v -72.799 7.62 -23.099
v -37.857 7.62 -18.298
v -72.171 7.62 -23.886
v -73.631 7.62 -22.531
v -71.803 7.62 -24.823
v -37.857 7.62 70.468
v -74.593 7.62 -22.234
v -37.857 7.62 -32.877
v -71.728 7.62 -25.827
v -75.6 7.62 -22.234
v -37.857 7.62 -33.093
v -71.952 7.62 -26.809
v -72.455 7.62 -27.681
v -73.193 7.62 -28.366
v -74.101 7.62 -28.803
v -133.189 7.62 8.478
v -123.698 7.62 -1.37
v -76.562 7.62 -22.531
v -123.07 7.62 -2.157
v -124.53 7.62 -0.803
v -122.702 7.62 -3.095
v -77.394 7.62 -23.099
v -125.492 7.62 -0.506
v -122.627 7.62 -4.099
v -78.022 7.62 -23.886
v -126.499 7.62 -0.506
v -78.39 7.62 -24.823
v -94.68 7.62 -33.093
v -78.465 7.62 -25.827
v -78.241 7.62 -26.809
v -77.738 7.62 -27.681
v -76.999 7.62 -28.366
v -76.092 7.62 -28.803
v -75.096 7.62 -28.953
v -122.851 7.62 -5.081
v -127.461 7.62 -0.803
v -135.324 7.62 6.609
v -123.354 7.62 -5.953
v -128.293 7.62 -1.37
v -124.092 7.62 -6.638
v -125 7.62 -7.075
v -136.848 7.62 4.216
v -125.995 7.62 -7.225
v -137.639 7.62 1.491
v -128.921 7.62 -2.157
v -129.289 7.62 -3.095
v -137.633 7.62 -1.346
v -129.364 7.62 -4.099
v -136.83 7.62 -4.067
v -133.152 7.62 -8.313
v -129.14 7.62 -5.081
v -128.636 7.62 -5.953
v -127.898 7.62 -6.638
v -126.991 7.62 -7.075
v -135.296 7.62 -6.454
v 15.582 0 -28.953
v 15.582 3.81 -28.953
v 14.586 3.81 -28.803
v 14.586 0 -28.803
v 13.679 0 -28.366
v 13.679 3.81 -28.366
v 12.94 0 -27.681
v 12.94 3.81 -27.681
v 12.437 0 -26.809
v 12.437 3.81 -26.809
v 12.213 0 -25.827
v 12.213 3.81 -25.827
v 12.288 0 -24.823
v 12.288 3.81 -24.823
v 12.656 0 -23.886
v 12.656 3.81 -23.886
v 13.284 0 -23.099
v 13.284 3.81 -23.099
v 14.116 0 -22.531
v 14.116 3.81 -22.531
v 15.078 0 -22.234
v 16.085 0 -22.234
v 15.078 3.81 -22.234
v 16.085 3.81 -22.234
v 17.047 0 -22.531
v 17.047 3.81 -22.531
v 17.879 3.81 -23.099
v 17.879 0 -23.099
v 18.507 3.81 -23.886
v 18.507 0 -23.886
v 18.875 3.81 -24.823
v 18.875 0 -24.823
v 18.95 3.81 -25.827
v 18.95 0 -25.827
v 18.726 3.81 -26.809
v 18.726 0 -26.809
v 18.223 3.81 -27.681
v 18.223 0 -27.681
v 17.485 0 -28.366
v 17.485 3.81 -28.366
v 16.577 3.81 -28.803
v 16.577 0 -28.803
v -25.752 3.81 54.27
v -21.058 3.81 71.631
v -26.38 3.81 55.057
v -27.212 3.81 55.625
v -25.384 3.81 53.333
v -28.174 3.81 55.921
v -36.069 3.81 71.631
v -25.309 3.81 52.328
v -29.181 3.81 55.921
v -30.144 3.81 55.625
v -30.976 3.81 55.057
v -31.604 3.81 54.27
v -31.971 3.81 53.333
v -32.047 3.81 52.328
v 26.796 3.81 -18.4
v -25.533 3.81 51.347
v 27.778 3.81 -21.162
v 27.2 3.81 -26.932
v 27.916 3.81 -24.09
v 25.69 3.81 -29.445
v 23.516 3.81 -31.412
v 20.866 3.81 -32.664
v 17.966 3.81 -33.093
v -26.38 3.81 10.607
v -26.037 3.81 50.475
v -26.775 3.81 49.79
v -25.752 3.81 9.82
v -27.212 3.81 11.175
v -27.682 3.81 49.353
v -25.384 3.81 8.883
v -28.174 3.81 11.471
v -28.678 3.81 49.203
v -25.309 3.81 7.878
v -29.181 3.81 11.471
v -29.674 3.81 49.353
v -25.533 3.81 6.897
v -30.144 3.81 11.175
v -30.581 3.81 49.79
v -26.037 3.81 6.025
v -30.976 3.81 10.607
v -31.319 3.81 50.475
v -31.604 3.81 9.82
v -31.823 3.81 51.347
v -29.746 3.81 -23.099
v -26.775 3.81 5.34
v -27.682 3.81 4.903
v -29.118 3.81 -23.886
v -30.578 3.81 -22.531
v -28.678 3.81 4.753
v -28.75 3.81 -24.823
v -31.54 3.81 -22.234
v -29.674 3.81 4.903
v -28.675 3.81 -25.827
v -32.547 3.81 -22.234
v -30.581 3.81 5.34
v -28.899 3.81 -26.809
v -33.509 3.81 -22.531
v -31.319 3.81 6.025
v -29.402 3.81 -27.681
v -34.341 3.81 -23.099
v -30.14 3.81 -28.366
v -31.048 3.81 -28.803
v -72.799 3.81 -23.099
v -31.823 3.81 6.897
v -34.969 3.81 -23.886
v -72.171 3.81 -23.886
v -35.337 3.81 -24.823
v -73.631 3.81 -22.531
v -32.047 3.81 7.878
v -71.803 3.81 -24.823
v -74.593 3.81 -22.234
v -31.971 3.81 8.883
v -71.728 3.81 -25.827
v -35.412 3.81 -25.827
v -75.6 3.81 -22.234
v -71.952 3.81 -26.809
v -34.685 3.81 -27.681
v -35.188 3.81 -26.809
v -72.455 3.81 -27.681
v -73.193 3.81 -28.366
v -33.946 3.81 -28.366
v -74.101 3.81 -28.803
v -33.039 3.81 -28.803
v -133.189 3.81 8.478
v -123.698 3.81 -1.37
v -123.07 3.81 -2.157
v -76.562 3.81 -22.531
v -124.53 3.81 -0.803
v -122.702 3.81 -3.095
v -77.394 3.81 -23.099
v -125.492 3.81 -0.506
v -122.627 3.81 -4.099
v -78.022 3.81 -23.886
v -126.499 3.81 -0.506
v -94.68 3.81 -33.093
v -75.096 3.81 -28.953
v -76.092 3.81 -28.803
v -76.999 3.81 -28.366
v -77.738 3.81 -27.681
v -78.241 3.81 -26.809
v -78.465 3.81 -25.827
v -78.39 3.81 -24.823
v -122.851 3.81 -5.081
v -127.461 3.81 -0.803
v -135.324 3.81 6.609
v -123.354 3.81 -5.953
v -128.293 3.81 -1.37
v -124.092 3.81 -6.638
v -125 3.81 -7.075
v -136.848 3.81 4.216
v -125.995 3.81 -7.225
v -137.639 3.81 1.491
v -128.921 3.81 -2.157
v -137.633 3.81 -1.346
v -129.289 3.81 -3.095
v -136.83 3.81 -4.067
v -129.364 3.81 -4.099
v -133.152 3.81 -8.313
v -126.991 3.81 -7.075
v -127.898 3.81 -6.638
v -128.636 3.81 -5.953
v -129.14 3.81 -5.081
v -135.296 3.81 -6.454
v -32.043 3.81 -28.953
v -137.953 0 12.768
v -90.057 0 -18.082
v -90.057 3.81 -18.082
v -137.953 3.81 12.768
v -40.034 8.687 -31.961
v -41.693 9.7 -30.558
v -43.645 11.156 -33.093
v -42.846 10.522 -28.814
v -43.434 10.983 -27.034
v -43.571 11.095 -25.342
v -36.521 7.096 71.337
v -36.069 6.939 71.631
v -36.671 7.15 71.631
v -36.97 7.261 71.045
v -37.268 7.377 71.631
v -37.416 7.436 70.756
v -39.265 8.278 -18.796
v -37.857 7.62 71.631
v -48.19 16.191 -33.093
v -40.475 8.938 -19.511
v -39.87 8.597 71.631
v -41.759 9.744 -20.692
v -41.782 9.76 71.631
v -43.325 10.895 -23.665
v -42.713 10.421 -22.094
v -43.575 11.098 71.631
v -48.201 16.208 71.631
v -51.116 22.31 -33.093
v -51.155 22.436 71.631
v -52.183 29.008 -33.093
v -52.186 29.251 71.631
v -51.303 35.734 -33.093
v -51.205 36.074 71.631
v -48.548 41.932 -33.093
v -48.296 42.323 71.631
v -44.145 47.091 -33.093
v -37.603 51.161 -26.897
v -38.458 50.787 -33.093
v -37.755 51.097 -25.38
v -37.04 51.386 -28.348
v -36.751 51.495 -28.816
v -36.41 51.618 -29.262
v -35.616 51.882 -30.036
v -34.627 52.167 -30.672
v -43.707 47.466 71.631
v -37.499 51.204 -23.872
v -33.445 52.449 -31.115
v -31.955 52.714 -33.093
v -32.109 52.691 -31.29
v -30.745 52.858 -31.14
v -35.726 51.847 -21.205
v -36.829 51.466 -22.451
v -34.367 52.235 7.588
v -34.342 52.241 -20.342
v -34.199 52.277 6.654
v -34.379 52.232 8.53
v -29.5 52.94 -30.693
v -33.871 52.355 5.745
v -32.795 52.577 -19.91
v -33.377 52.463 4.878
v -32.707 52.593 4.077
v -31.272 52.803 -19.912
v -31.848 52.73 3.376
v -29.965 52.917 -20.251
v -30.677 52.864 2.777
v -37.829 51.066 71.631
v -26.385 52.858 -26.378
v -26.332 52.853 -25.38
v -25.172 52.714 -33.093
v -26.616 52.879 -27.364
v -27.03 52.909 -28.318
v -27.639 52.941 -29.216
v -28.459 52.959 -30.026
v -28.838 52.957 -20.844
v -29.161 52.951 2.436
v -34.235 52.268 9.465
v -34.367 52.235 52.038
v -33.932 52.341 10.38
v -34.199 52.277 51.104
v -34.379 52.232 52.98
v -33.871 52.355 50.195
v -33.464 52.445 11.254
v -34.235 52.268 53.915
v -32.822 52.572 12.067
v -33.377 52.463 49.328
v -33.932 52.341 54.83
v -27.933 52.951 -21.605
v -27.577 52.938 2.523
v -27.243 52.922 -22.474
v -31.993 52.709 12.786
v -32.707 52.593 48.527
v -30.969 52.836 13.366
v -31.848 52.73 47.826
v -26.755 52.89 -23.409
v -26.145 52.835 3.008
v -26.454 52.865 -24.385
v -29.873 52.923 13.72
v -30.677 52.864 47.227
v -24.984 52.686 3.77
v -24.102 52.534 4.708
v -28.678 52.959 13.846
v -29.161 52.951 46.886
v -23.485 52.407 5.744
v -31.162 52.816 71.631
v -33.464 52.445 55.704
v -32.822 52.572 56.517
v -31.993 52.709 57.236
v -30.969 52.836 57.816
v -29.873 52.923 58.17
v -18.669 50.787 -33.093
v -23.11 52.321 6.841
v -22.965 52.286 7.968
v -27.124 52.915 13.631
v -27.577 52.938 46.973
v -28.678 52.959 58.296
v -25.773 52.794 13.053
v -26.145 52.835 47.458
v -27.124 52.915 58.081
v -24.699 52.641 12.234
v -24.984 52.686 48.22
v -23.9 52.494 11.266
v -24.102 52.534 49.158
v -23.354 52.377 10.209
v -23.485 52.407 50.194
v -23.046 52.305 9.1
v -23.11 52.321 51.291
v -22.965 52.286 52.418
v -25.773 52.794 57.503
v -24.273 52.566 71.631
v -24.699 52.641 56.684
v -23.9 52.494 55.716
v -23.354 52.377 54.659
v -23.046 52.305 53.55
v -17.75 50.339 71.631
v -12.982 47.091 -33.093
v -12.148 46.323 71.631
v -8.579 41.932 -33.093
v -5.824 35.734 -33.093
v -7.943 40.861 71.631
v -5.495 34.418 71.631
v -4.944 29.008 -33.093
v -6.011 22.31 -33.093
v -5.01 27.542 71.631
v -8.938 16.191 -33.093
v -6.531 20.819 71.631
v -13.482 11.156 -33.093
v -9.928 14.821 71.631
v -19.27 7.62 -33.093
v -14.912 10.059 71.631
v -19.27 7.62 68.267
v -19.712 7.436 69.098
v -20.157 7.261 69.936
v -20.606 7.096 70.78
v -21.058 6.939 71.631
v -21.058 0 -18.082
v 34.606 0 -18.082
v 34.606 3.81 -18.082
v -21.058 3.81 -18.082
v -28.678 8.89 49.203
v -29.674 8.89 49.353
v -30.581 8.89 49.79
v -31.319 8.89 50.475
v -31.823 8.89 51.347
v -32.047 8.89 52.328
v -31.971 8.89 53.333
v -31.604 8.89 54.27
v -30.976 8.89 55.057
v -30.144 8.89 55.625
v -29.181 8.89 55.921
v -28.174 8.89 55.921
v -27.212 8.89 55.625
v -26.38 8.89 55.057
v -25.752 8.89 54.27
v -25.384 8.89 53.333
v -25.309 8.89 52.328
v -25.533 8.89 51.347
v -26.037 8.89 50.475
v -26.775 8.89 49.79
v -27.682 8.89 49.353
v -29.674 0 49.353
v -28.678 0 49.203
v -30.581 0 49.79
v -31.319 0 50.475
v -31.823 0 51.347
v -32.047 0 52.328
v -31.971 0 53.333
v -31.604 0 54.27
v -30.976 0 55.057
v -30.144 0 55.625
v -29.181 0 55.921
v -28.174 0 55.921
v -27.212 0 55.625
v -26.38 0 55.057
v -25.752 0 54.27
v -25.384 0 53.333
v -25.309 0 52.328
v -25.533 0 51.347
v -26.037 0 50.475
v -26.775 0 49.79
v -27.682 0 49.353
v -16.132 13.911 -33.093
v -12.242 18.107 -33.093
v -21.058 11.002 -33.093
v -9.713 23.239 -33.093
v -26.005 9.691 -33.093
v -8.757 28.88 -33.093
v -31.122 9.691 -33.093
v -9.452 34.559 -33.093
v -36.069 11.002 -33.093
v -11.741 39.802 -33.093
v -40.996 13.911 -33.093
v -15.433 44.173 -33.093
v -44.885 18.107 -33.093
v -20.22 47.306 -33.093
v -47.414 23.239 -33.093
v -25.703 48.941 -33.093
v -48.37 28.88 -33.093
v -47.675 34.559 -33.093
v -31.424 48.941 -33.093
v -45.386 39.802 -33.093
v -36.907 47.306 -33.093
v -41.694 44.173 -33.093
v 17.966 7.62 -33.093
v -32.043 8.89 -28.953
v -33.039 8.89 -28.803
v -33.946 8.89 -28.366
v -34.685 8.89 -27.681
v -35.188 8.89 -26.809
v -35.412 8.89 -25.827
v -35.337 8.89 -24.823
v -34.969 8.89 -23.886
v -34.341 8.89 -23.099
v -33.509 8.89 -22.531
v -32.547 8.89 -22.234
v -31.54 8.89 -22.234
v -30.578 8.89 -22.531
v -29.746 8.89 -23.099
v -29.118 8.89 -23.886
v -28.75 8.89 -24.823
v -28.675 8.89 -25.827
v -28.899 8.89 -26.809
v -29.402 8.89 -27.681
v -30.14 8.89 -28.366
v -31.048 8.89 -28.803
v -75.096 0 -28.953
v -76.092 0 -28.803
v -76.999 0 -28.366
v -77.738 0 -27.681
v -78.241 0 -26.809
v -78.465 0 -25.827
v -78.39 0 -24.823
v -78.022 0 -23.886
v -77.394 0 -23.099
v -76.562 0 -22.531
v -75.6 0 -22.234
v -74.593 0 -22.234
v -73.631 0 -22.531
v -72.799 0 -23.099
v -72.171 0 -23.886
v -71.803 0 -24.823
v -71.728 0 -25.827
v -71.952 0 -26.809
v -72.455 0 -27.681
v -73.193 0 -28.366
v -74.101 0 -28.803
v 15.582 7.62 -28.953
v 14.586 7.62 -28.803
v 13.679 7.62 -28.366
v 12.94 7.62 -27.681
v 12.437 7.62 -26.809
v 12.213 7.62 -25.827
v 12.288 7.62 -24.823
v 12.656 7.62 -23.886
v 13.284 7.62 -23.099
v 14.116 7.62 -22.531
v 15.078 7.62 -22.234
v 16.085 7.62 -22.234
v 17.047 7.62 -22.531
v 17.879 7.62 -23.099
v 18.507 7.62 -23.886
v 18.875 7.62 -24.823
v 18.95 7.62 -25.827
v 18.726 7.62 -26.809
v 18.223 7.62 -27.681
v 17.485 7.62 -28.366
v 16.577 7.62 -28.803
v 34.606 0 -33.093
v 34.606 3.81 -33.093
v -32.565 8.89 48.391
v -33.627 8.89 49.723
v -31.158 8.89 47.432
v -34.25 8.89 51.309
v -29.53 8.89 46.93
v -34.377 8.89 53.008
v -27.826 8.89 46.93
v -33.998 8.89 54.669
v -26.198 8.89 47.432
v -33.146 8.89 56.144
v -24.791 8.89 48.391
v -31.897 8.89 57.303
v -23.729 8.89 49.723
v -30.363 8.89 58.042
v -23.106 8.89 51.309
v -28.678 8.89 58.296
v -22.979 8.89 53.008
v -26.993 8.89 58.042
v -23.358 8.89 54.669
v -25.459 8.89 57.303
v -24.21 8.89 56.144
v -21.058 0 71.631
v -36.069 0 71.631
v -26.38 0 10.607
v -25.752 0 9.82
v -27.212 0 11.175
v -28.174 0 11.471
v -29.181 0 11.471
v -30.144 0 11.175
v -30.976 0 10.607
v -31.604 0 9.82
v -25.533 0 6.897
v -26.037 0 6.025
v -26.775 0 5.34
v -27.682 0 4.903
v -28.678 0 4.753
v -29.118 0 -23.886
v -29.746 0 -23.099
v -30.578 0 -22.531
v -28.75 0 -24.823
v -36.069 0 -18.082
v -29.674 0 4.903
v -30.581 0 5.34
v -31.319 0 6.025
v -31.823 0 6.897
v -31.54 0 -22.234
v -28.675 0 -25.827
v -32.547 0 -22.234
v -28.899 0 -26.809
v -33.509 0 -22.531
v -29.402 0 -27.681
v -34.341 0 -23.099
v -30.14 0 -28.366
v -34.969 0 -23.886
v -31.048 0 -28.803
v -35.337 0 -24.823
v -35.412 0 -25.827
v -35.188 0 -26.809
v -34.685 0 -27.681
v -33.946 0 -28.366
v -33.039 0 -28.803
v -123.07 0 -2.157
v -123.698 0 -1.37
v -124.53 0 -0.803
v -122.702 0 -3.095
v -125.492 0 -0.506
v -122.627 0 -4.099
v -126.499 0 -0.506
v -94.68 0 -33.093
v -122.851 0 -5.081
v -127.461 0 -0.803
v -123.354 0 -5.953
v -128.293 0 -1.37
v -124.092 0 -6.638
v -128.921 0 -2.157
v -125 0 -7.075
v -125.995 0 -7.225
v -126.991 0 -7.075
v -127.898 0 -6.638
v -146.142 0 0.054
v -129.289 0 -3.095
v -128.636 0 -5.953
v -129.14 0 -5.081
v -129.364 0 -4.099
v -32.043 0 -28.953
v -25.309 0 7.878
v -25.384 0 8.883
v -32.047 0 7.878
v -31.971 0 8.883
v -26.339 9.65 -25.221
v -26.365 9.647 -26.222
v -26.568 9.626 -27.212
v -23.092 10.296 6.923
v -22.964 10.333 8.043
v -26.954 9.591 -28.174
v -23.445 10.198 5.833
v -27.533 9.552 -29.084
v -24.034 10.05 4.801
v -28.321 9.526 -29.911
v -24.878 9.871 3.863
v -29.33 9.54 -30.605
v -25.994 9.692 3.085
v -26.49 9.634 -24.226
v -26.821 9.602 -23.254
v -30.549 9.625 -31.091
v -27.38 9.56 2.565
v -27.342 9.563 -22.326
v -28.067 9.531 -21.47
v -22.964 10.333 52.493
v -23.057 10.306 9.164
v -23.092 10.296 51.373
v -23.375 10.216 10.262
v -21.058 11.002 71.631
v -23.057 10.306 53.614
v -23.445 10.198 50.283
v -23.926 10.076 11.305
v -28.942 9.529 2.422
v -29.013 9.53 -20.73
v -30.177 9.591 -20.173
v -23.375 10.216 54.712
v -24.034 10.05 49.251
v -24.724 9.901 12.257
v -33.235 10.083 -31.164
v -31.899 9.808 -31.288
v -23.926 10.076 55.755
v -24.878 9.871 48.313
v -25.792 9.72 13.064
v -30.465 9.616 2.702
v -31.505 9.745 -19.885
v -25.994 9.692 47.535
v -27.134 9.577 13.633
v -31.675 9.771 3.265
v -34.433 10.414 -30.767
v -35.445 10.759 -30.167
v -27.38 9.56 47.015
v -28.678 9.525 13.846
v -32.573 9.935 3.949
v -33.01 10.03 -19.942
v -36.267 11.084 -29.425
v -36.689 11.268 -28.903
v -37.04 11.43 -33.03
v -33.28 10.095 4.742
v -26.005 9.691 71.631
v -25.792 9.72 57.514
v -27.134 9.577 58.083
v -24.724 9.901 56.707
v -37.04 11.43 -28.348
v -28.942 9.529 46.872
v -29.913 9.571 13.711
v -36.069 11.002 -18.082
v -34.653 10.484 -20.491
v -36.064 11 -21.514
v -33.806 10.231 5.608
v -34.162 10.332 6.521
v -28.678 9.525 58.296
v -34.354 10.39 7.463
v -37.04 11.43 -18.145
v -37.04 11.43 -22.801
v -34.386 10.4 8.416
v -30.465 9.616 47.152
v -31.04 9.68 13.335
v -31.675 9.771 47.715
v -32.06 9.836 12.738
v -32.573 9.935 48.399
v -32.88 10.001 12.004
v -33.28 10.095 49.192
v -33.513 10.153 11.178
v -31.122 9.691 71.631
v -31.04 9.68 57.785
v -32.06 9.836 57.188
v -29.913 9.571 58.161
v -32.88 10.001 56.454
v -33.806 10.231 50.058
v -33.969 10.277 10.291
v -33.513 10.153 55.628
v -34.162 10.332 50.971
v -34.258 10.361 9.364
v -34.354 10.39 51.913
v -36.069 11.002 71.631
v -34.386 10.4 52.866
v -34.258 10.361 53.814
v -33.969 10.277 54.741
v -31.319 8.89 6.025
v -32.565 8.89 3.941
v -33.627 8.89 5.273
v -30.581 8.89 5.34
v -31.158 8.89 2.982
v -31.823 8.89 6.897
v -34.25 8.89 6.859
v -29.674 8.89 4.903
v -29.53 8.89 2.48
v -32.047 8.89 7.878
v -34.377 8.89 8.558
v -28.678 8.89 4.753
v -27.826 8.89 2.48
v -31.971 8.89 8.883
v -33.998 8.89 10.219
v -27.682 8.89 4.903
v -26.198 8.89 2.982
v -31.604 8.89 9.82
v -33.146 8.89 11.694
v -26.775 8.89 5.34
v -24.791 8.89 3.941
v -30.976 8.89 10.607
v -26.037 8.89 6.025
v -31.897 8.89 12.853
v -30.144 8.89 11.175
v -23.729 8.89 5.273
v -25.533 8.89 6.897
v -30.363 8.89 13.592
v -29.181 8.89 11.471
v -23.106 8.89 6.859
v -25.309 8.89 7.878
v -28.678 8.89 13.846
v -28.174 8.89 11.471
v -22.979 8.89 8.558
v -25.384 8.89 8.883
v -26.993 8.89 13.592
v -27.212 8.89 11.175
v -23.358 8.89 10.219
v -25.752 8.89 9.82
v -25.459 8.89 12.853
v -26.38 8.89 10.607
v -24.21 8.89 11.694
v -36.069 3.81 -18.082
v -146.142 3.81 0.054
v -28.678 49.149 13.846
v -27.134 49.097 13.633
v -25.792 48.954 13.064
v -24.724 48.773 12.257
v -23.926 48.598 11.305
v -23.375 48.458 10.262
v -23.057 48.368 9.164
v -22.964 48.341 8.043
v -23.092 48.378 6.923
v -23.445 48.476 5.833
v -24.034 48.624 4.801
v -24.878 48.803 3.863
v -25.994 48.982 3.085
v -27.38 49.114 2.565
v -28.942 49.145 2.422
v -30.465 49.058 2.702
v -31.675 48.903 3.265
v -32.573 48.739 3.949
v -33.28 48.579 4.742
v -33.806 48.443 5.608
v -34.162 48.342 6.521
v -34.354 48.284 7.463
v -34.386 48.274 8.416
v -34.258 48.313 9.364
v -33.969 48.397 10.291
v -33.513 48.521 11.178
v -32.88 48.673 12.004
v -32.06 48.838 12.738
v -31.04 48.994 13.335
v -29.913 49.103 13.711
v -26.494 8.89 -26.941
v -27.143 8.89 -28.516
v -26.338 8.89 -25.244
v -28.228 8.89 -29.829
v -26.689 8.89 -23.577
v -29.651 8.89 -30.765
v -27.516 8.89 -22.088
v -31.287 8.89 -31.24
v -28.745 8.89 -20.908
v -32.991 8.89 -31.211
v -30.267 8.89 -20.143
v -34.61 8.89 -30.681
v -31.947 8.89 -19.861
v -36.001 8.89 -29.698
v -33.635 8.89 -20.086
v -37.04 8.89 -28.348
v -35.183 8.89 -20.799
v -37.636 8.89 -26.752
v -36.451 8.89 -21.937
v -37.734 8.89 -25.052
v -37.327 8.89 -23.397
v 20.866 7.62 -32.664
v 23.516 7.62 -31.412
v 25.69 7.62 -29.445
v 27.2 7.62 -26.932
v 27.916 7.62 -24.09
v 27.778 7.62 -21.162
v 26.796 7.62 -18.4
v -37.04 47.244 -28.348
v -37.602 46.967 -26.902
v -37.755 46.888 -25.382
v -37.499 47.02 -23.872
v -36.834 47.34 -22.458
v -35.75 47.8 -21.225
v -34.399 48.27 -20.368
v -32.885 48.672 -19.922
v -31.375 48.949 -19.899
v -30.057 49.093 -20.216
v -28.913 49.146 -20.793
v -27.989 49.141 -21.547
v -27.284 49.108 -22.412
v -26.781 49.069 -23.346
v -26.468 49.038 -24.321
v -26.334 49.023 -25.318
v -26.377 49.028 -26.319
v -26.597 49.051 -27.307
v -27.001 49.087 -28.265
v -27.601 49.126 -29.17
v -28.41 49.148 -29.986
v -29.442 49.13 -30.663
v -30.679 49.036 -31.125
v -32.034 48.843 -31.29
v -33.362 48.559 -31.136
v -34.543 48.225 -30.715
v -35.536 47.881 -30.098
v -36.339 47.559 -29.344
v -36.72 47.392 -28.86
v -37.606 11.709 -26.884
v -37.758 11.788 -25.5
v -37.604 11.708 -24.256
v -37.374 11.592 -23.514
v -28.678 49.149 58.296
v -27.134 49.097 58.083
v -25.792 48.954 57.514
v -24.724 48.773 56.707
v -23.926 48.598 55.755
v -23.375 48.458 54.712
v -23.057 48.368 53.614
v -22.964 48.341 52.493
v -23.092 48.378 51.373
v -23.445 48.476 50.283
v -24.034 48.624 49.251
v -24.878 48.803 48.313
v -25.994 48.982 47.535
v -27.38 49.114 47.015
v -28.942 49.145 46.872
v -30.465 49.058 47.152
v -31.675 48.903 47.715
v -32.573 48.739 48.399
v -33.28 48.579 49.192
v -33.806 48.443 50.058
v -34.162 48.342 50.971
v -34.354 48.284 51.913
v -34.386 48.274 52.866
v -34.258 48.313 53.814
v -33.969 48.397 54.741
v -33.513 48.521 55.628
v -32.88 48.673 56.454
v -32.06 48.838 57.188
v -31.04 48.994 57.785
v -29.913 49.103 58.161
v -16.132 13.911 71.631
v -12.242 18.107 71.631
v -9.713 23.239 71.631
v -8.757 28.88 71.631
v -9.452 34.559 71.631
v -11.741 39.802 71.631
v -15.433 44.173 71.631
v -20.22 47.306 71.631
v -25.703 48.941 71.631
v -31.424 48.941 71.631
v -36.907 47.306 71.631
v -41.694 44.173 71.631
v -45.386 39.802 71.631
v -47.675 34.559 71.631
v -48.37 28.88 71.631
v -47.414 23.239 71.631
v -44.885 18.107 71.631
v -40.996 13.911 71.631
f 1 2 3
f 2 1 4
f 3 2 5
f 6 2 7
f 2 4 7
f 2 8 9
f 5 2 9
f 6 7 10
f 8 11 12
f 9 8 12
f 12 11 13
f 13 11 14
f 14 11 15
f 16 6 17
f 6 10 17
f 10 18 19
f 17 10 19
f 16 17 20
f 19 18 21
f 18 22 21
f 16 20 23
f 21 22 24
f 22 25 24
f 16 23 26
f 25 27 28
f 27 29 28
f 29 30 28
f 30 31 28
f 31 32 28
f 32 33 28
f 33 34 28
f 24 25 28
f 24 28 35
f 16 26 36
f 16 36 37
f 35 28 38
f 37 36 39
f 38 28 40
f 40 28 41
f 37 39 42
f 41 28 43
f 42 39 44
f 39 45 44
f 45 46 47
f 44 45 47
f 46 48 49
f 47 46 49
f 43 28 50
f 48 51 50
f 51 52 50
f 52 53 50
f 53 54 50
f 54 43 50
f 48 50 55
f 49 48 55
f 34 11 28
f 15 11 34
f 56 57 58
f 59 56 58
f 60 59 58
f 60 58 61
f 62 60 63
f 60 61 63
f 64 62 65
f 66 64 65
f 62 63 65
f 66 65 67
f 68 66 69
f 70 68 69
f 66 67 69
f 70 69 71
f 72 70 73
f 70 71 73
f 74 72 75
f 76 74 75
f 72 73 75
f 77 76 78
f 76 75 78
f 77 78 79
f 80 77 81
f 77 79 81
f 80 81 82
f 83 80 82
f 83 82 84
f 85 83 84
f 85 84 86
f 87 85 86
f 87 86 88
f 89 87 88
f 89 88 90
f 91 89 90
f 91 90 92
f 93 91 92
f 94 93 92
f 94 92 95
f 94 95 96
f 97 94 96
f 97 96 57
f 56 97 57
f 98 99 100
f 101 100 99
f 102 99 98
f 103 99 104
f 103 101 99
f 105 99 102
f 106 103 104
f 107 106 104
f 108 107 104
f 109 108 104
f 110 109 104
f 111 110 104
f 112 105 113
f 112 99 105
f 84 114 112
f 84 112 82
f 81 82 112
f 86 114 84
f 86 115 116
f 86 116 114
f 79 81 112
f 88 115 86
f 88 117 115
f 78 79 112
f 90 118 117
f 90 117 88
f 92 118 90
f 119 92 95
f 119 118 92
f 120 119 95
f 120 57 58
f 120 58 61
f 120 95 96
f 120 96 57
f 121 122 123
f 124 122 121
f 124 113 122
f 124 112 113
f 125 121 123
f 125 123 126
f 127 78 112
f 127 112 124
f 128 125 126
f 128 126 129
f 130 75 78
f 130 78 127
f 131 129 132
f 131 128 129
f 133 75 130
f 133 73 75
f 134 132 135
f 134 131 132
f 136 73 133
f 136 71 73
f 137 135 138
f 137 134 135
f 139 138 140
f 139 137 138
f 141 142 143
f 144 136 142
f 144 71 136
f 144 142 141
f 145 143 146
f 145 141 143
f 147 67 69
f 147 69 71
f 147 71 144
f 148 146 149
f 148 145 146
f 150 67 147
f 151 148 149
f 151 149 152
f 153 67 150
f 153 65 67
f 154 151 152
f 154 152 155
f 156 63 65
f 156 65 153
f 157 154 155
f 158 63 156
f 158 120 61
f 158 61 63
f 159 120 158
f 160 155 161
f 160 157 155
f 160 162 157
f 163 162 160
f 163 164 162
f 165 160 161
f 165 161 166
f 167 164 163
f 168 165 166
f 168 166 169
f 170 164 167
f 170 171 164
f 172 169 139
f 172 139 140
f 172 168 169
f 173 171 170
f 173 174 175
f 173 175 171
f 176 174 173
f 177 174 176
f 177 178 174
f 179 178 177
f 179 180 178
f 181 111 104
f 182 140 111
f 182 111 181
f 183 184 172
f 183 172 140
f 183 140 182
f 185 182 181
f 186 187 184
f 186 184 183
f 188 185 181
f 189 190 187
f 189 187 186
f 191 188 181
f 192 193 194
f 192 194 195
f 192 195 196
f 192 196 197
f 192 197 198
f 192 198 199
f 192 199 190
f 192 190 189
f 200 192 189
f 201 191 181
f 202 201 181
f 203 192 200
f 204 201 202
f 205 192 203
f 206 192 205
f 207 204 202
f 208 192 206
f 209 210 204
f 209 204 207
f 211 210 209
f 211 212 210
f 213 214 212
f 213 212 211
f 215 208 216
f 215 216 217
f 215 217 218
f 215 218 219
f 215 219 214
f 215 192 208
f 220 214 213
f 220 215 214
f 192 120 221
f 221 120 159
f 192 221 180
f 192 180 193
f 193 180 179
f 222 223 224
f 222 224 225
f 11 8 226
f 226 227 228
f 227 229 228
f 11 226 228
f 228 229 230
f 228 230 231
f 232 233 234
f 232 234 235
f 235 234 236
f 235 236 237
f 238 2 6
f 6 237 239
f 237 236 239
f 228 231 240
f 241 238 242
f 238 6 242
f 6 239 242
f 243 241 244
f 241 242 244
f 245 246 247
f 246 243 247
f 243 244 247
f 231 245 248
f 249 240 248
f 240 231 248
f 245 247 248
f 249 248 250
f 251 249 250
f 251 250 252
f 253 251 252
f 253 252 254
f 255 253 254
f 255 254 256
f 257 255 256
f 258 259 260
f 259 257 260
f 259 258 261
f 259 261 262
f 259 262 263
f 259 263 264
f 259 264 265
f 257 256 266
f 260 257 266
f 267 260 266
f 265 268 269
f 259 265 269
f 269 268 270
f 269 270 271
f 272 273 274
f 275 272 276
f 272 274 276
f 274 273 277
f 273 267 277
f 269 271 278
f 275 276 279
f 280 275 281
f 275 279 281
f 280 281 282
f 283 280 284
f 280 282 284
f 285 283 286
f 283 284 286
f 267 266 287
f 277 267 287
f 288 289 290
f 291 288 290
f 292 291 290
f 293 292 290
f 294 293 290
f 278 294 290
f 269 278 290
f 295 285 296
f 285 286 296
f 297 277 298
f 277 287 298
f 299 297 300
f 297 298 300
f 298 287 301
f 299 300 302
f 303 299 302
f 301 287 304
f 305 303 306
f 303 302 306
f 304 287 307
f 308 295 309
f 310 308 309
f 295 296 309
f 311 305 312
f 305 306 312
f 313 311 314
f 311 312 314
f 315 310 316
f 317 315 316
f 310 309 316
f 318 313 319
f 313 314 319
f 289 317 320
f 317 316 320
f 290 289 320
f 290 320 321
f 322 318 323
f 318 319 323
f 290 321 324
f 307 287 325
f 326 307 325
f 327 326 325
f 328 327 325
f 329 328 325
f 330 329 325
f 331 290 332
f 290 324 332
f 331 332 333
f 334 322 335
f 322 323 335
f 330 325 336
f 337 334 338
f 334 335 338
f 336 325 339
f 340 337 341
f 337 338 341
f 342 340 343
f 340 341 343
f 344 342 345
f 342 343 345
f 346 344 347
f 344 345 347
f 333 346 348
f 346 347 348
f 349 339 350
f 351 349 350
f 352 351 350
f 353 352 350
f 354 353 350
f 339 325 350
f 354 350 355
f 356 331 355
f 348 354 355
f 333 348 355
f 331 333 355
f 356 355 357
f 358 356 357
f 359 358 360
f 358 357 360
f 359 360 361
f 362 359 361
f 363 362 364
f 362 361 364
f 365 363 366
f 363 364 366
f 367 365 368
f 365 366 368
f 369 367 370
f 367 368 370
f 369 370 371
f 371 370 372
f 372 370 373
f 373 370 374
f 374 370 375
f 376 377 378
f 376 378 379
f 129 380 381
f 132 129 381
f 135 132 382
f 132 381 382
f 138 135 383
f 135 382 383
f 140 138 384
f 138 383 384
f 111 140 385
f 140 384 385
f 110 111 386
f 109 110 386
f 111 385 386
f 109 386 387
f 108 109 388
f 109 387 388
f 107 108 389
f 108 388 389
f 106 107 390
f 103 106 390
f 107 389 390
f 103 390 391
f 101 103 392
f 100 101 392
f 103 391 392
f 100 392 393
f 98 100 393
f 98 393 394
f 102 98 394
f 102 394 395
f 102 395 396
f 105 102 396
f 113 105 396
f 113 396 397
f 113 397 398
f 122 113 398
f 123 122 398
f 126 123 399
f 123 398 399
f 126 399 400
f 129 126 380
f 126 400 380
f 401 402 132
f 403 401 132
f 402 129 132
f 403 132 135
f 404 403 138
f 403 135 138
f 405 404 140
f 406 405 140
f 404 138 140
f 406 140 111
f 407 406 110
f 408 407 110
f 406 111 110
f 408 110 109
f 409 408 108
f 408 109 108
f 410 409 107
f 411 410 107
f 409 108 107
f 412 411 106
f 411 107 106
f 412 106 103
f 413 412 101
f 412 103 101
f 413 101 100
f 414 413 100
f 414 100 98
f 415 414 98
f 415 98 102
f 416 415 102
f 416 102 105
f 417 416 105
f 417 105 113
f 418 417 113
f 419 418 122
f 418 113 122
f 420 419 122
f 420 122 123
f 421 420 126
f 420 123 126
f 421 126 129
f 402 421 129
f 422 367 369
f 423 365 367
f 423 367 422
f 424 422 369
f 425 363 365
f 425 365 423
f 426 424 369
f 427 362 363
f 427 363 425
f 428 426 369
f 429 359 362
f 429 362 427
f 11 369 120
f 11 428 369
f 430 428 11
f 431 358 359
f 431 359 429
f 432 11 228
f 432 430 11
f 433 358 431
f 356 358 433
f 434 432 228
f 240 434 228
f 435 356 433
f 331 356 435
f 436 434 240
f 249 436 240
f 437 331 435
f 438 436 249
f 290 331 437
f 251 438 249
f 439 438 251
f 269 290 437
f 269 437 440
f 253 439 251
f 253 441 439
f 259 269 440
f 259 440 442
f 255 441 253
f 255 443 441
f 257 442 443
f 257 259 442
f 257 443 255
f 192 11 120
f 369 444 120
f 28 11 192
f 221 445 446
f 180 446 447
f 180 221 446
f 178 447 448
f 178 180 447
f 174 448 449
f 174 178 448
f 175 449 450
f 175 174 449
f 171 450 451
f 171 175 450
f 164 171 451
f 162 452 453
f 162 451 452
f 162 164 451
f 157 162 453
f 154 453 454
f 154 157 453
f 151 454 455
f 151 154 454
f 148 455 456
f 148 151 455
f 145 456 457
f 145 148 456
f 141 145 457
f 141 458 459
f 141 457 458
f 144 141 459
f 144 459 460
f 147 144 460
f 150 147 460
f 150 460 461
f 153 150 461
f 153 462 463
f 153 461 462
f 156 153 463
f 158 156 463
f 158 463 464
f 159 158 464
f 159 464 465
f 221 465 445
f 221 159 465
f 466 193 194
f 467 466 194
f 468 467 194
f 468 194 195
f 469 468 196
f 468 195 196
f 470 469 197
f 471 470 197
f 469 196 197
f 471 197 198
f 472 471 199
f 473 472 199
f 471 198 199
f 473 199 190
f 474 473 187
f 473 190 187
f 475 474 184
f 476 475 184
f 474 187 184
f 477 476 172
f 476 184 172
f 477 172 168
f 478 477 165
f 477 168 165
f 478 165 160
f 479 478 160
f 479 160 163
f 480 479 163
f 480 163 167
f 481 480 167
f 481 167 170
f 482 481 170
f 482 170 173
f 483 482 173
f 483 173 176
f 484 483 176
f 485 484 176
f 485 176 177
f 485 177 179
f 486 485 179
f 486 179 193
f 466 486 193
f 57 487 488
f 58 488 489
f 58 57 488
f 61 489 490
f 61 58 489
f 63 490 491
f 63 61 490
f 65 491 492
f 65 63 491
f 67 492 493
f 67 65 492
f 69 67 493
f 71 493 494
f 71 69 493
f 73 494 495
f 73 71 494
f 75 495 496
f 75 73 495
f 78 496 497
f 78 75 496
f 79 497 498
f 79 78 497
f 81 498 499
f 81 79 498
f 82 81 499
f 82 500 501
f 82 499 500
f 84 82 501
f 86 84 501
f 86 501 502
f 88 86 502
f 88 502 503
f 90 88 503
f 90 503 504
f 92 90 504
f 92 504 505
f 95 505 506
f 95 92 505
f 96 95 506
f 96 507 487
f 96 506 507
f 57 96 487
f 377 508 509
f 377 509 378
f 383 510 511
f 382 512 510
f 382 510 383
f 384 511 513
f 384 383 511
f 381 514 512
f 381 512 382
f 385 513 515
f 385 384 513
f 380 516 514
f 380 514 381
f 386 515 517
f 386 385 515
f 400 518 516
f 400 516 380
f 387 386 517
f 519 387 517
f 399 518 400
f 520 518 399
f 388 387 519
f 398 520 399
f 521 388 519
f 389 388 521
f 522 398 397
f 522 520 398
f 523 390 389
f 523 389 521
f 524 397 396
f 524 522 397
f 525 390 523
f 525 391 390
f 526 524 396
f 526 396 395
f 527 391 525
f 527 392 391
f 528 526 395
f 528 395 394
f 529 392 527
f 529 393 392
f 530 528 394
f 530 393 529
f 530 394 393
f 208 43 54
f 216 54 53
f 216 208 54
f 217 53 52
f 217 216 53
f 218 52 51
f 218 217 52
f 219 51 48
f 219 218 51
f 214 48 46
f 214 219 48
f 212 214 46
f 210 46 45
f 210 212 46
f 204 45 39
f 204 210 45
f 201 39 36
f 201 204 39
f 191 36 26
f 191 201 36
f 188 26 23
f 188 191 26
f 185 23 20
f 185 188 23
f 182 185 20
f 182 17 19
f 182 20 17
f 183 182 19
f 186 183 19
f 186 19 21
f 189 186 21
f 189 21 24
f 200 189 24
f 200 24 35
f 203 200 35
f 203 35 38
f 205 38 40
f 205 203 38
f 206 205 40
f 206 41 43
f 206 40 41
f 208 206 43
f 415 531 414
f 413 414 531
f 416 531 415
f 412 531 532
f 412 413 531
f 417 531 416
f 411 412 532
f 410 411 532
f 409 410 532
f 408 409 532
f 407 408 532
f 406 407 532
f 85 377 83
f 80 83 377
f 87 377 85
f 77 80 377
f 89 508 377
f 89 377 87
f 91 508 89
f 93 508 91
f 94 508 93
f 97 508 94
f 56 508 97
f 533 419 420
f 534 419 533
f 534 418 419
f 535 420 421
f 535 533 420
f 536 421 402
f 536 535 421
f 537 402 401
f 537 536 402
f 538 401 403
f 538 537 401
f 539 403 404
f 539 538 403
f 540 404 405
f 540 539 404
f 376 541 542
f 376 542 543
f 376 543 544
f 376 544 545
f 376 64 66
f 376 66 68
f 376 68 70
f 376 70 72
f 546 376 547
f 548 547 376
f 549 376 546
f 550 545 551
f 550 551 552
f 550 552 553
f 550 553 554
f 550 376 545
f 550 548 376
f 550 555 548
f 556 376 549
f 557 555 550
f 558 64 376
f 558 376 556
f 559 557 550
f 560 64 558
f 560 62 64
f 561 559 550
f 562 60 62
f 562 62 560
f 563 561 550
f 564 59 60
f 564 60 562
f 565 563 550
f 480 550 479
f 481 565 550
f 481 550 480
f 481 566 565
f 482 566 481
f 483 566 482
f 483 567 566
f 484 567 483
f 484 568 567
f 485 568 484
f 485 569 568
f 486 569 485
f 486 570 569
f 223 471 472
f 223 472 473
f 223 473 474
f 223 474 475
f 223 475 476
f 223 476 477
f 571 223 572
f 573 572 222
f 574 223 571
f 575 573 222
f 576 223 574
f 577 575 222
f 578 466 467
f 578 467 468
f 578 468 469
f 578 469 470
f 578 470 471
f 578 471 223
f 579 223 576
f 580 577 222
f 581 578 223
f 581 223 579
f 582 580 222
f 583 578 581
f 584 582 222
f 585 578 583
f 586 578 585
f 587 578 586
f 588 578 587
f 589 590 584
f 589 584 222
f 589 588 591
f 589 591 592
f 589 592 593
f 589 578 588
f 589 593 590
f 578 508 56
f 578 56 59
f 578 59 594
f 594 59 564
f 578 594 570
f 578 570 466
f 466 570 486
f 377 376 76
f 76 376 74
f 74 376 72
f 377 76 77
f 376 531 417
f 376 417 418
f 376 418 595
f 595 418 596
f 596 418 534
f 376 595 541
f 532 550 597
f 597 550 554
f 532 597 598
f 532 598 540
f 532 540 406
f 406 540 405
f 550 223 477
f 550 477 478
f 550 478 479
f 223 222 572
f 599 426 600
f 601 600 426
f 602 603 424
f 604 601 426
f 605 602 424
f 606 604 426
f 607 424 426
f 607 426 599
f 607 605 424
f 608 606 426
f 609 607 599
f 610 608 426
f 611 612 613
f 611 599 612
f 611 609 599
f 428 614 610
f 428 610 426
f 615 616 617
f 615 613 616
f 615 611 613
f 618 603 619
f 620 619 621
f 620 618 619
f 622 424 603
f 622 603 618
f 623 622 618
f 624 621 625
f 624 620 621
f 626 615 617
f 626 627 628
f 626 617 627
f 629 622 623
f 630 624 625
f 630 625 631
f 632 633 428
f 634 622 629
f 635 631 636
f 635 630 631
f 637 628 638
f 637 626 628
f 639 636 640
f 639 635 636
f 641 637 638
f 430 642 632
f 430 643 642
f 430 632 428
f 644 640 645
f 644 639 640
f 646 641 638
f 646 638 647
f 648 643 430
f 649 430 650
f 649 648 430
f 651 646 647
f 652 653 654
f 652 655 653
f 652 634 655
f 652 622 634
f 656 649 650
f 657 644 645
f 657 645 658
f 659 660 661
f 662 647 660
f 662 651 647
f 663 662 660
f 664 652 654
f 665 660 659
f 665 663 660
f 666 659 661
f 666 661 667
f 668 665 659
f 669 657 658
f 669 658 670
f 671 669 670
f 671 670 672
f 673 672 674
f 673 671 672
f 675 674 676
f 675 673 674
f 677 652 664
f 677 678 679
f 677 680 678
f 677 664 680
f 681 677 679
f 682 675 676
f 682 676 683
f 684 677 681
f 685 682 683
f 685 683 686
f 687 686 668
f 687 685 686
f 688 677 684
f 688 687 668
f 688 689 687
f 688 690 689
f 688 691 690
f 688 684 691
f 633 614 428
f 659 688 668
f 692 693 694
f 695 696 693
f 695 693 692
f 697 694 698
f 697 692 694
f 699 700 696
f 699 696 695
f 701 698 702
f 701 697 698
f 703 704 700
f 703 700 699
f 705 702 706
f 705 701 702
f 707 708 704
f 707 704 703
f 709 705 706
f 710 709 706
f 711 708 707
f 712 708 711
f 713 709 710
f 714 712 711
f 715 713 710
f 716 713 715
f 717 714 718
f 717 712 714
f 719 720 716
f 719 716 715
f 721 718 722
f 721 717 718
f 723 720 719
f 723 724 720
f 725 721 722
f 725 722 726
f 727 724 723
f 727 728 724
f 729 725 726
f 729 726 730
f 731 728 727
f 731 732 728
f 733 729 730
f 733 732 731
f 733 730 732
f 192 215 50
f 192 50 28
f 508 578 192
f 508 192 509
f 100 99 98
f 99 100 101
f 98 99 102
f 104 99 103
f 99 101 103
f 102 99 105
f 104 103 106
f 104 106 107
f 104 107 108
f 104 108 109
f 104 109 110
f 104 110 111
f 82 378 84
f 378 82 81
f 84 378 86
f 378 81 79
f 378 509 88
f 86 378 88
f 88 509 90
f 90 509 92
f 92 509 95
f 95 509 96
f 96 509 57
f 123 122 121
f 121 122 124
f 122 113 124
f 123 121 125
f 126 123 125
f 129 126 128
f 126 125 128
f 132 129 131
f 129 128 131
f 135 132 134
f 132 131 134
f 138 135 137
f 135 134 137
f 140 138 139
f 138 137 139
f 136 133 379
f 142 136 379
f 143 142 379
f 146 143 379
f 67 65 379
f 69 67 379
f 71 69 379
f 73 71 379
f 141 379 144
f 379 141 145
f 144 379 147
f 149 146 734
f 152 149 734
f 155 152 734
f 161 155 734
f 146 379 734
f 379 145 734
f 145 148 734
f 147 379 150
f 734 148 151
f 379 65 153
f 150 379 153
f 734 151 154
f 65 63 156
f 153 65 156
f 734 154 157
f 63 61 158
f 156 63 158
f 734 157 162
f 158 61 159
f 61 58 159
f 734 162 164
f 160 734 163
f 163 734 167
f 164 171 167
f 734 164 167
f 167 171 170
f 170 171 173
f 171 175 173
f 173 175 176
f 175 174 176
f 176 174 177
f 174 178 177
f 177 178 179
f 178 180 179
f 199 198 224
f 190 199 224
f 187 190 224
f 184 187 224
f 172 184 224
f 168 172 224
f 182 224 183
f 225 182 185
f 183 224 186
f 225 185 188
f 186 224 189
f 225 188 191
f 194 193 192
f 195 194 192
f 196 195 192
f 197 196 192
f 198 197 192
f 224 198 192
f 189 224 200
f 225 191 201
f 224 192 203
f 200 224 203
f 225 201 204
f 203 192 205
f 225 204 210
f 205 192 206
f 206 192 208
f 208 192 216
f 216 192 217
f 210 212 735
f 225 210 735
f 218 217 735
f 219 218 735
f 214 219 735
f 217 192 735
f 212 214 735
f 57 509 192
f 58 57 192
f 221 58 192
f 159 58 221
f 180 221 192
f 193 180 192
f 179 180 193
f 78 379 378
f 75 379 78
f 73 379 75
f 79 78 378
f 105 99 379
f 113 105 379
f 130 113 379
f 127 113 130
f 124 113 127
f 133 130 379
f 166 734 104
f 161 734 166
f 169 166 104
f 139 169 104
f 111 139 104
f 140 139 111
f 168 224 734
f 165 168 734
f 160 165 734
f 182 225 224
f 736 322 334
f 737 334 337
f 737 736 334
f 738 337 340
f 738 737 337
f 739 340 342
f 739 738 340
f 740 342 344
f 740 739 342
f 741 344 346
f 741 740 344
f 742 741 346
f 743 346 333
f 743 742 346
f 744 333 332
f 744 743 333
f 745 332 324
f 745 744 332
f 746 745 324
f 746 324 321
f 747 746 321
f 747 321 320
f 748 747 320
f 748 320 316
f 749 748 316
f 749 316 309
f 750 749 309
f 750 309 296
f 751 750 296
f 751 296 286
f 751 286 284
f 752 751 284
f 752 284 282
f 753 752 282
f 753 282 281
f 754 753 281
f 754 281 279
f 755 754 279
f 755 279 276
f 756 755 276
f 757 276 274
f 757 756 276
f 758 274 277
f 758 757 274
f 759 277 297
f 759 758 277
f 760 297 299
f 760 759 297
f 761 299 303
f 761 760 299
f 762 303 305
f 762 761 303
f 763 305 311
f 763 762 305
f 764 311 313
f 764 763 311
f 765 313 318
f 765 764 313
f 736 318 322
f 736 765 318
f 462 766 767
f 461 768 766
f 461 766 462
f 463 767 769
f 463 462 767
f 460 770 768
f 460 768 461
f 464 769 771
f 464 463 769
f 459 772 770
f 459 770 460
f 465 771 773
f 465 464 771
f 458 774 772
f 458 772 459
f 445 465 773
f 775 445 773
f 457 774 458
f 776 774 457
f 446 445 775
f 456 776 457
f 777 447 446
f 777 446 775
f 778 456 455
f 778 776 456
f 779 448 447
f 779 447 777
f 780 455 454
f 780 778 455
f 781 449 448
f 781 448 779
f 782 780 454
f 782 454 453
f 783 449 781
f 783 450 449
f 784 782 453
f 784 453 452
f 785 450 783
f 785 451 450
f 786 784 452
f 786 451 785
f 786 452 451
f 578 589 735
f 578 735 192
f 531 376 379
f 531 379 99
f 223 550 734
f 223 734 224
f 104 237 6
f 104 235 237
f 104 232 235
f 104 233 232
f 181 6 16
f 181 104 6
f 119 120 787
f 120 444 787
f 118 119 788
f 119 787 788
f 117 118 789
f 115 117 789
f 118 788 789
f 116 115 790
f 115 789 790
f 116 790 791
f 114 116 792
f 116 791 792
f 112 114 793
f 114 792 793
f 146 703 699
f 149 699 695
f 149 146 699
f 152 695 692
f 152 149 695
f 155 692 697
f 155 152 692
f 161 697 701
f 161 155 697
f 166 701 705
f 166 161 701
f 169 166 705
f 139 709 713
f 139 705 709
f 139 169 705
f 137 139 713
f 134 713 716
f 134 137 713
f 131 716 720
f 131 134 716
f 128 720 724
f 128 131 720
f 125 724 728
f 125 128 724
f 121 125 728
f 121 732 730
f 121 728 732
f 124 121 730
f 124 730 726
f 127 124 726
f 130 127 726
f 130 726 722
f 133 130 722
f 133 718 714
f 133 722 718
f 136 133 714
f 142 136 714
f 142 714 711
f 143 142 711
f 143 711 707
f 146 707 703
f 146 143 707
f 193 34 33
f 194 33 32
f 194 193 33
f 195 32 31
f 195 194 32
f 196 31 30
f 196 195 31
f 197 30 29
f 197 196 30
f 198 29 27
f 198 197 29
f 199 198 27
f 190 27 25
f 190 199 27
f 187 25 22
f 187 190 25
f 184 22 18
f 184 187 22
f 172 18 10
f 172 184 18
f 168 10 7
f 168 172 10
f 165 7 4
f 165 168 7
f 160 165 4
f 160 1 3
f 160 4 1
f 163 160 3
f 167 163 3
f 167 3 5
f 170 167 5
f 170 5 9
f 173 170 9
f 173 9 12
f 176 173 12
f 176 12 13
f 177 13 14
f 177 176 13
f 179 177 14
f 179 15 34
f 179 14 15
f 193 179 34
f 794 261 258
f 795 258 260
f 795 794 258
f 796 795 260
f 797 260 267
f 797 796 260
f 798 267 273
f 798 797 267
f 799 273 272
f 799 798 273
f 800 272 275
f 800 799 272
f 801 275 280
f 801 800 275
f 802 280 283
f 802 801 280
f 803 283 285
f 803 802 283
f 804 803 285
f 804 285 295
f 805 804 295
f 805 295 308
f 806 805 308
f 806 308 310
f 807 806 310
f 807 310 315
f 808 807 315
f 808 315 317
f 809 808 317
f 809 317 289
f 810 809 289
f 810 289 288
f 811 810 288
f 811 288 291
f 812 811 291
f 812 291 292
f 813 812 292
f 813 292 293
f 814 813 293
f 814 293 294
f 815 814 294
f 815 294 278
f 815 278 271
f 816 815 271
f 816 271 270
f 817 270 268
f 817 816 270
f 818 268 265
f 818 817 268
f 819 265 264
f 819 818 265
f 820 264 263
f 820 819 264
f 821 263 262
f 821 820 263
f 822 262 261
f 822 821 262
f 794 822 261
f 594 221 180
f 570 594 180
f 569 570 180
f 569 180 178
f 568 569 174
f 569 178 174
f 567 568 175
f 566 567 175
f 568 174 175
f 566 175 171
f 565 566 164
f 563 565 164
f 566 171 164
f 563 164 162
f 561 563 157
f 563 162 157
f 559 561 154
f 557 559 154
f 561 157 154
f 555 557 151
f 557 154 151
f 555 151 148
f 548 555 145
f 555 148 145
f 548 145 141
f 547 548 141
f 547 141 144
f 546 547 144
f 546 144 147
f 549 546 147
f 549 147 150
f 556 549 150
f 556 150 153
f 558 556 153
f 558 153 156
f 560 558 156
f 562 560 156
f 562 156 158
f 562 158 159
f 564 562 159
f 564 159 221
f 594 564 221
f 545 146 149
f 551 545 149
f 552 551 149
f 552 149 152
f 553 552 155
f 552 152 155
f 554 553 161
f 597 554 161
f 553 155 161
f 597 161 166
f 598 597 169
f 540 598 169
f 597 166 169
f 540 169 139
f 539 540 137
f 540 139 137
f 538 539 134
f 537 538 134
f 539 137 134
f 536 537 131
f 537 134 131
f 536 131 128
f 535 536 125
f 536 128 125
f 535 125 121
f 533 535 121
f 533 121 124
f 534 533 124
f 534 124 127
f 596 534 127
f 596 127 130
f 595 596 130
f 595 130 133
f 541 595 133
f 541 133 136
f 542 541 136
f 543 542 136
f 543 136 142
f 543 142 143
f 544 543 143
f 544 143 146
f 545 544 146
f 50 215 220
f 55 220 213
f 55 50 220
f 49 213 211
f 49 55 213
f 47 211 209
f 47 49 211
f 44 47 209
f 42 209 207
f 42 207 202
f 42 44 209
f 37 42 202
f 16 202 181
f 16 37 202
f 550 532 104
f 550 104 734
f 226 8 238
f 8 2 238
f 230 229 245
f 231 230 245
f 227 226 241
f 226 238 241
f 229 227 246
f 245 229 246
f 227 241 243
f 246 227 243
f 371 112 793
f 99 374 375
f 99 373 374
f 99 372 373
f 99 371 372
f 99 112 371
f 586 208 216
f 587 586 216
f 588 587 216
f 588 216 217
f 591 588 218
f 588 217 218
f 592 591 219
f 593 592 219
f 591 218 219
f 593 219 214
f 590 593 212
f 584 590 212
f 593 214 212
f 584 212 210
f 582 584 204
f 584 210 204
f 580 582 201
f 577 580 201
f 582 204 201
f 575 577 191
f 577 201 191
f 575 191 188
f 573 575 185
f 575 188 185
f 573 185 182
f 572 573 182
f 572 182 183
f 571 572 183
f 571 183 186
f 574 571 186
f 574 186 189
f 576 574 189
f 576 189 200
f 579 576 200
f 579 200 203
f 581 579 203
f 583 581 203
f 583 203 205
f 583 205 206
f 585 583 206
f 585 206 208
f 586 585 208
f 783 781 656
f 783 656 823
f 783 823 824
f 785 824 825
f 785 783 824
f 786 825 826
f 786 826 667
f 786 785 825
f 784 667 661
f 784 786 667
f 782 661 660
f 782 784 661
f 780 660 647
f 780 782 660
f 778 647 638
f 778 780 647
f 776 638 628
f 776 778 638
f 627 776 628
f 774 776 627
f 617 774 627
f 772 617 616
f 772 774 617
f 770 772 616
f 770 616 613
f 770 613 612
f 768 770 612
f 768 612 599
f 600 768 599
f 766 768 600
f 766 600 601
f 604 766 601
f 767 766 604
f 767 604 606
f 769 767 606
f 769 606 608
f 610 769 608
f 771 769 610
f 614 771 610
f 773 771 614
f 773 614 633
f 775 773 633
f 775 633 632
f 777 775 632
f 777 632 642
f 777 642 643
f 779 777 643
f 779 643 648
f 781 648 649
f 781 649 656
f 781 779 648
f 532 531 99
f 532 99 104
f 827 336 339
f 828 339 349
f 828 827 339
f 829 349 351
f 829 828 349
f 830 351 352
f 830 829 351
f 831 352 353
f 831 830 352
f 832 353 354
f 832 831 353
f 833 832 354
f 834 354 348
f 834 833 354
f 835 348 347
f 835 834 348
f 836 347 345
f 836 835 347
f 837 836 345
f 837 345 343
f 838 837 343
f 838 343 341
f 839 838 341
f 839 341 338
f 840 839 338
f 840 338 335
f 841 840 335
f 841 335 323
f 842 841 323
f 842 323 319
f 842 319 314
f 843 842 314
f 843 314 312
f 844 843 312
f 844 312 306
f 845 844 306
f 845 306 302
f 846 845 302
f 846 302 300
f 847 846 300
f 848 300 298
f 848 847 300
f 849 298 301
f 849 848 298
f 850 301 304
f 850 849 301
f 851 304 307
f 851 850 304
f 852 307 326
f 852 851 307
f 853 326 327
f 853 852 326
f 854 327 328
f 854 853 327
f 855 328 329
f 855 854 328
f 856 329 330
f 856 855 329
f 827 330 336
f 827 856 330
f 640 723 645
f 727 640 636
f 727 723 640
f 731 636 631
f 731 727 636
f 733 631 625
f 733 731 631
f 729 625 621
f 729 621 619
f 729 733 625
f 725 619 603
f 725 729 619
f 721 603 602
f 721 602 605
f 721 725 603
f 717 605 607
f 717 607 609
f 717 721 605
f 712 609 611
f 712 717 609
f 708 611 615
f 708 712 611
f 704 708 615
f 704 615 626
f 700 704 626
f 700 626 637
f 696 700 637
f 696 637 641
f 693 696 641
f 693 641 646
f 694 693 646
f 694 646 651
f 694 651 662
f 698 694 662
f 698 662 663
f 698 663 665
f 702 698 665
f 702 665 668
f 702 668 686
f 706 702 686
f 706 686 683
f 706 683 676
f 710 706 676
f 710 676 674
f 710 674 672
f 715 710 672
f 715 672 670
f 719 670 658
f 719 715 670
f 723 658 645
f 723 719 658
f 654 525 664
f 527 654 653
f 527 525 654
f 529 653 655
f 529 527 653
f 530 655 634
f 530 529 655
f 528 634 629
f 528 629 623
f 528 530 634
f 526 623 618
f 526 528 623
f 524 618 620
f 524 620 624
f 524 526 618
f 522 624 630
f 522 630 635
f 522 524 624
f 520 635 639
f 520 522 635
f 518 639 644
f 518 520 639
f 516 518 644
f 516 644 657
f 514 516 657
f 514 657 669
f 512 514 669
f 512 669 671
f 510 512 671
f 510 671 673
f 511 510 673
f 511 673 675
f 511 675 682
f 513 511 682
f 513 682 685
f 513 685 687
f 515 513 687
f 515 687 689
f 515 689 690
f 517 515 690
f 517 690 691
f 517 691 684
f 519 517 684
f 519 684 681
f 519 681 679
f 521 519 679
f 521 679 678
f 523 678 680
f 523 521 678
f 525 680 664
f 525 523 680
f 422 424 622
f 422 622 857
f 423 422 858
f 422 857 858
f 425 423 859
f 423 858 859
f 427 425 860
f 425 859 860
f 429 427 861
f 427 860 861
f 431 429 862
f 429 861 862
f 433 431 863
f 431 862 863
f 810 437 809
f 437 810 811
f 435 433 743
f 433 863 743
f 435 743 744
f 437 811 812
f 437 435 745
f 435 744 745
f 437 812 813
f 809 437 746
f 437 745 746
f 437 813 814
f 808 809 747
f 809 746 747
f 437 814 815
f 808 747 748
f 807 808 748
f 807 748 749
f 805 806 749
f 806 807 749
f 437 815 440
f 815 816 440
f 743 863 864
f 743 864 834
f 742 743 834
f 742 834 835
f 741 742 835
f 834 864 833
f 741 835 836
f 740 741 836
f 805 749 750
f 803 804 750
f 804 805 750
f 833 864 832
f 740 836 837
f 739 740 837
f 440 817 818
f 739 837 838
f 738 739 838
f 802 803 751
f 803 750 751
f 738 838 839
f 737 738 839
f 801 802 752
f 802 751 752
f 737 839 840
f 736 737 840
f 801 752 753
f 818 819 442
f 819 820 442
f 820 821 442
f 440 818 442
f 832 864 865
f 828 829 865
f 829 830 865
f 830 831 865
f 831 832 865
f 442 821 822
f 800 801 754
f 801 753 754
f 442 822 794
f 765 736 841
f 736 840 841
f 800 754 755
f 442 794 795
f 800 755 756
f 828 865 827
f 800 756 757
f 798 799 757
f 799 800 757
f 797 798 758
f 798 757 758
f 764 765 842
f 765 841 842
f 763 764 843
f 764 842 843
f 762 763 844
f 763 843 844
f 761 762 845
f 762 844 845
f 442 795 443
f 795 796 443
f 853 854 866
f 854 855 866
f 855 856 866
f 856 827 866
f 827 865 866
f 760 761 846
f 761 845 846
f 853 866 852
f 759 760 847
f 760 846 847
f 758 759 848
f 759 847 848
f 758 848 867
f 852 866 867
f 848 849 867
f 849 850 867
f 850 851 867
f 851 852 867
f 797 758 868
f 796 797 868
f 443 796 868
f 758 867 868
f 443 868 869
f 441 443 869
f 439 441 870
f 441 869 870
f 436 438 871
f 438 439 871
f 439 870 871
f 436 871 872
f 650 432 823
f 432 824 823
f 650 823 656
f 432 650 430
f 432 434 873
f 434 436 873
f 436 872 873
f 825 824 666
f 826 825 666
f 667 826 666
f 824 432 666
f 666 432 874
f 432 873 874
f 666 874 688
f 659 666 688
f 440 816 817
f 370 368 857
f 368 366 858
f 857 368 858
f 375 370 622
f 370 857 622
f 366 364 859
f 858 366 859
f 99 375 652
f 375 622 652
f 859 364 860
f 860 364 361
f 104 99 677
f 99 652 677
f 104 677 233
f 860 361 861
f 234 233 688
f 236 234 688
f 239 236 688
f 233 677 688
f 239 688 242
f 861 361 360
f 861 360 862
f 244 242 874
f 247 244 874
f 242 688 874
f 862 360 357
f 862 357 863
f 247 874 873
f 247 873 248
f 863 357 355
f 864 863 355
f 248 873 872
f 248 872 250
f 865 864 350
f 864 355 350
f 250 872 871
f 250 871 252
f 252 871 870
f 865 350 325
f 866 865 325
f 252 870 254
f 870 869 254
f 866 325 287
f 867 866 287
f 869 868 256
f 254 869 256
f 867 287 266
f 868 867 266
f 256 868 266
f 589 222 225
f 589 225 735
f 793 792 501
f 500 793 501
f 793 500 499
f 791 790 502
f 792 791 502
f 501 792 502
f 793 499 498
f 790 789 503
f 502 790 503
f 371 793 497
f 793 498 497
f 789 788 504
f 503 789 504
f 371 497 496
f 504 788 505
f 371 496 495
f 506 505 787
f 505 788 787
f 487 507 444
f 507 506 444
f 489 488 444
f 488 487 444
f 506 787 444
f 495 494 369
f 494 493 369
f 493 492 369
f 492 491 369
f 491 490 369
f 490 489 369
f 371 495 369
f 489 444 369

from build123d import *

# Parameters (mm, degrees)
BOSS_EXTRUDE1_DEPTH     = 3.81
BOSS_EXTRUDE2_DEPTH     = 3.81
BOSS_EXTRUDE3_DEPTH     = 3.81
BOSS_EXTRUDE4_DEPTH     = 104.7242
SKETCH2_R               = 3.3782
CUT_EXTRUDE1_DEPTH      = 7.62
CUT_EXTRUDE3_DEPTH      = 45.974
CUT_EXTRUDE3_DEPTH_BACK = 2.54
SKETCH18_R              = 5.715
CUT_EXTRUDE5_DEPTH      = 188.428441235
CUT_EXTRUDE7_DEPTH      = 188.428441235
FILLET1_R               = 10
FILLET2_R               = 10


with BuildPart() as part:
    # Sketch1 → Boss-Extrude1 (new body)
    with BuildSketch(Plane(origin=(0, 0, 0), x_dir=(1, 0, 0), z_dir=(0, 1, 0))):
        Polygon((-94.679884126, 33.093313636), (34.606115874, 33.093313636), (34.606115874, 18.081913636), (-21.057984126, 18.081913636), (-21.057984126, -71.630886364), (-36.069384126, -71.630886364), (-36.069384126, 18.081913636), (-90.057084126, 18.081913636), (-137.953092438, -12.768415824), (-146.142419597, -0.054253981), align=None)
    extrude(amount=BOSS_EXTRUDE1_DEPTH)


with BuildPart() as body_2:
    # Sketch4 → Boss-Extrude2 (new body)
    with BuildSketch(Plane(origin=(0, 3.81, 0), x_dir=(1, 0, 0), z_dir=(0, 1, 0))):
        Polygon((-146.142419597, -0.054253981), (-94.679884126, 33.093313636), (34.606115874, 33.093313636), (-21.057984126, -71.630886364), (-36.069384126, -71.630886364), align=None)
    extrude(amount=BOSS_EXTRUDE2_DEPTH)

    # Sketch9 → Boss-Extrude3 (add)
    with BuildSketch(Plane(origin=(0, 7.62, 0), x_dir=(1, 0, 0), z_dir=(0, 1, 0))):
        with BuildLine():
            Line((-36.069384126, -71.630886364), (-21.057984126, -71.630886364))
            Line((-21.057984126, -71.630886364), (-21.057984126, 18.081913636))
            Line((-21.057984126, 18.081913636), (-21.057984126, 33.093313636))
            Line((-21.057984126, 33.093313636), (-36.069384126, 33.093313636))
            ThreePointArc((-36.069384126, 33.093313636), (-43.575084126, 25.587613636), (-36.069384126, 18.081913636))
            Line((-36.069384126, 18.081913636), (-36.069384126, -71.630886364))
        make_face()
    extrude(amount=BOSS_EXTRUDE3_DEPTH)

    # Sketch13 → Boss-Extrude4 (add, through all)
    with BuildSketch(Plane.XY.offset(71.630886364)):
        with BuildLine():
            Line((-36.069384126, 11.001793115), (-36.069384126, 6.939157436))
            ThreePointArc((-36.069384126, 6.939157436), (-28.563684126, 52.959), (-21.057984126, 6.939157436))
            Line((-21.057984126, 6.939157436), (-21.057984126, 11.001793115))
            ThreePointArc((-21.057984126, 11.001793115), (-28.563684126, 49.149), (-36.069384126, 11.001793115))
        make_face()
    extrude(amount=-BOSS_EXTRUDE4_DEPTH)


with BuildPart() as cut_extrude1_tool:
    # Sketch2 → Cut-Extrude1 (new, symmetric)
    with BuildSketch(Plane(origin=(0, 3.81, 0), x_dir=(1, 0, 0), z_dir=(0, 1, 0))):
        with Locations(Location((-125.995262913, 3.846573254, 0), (0, 0, 90))):
            Circle(SKETCH2_R)
        with Locations(Location((-75.096484126, 25.574913636, 0), (0, 0, 90))):
            Circle(SKETCH2_R)
        with Locations(Location((-32.043484126, 25.574913636, 0), (0, 0, 90))):
            Circle(SKETCH2_R)
        with Locations(Location((15.581515874, 25.574913636, 0), (0, 0, 90))):
            Circle(SKETCH2_R)
        with Locations(Location((-28.677984126, -8.130886364, 0), (0, 0, 90))):
            Circle(SKETCH2_R)
        with Locations(Location((-28.677984126, -52.580886364, 0), (0, 0, 90))):
            Circle(SKETCH2_R)
    extrude(amount=CUT_EXTRUDE1_DEPTH, both=True)


with BuildPart() as part_1:
    add(part.part)

    # Cut-Extrude1: cut by cut_extrude1_tool
    add(cut_extrude1_tool.part, mode=Mode.SUBTRACT)


with BuildPart() as body_2_1:
    add(body_2.part)

    # Cut-Extrude1: cut by cut_extrude1_tool
    add(cut_extrude1_tool.part, mode=Mode.SUBTRACT)

    # Sketch18 → Cut-Extrude3 (cut, two sides: drawn at the far end of the back side and taken through both)
    with BuildSketch(Plane(origin=(0, 11.43, 0), x_dir=(1, 0, 0), z_dir=(0, 1, 0)).offset(-CUT_EXTRUDE3_DEPTH_BACK)):
        with Locations(Location((-28.677984126, -52.580886364, 0), (0, 0, 270))):
            Circle(SKETCH18_R)
        with Locations(Location((-28.677984126, -8.130886364, 0), (0, 0, 270))):
            Circle(SKETCH18_R)
        with Locations(Location((-32.043484126, 25.574913636, 0), (0, 0, 150.968233854))):
            Circle(SKETCH18_R)
    extrude(amount=CUT_EXTRUDE3_DEPTH + CUT_EXTRUDE3_DEPTH_BACK, mode=Mode.SUBTRACT)

    # Sketch20 → Cut-Extrude5 (cut, through all)
    with BuildSketch(Plane.XY.offset(71.630886364)):
        with BuildLine():
            Line((-37.040398997, 11.43), (-20.086969256, 11.43))
            ThreePointArc((-20.086969256, 11.43), (-28.563684126, 9.525), (-37.040398997, 11.43))
        make_face()
    extrude(amount=-CUT_EXTRUDE5_DEPTH, mode=Mode.SUBTRACT)

    # Sketch21 → Cut-Extrude7 (cut, through all)
    with BuildSketch(Plane.XY.offset(71.630886364)):
        with BuildLine():
            Line((-43.575084126, 7.62), (-37.857273046, 7.62))
            ThreePointArc((-37.857273046, 7.62), (-40.839980424, 9.155537386), (-43.575084126, 11.098119715))
            Line((-43.575084126, 11.098119715), (-43.575084126, 9.359059858))
            Line((-43.575084126, 9.359059858), (-43.575084126, 7.62))
        make_face()
    extrude(amount=-CUT_EXTRUDE7_DEPTH, mode=Mode.SUBTRACT)

    # Fillet1
    fillet1_edges = [body_2_1.edges().sort_by_distance(p)[0] for p in [
        (34.606115874, 5.715, -33.093313636),
    ]]
    fillet(fillet1_edges, radius=FILLET1_R)

    # Fillet2
    fillet2_edges = [body_2_1.edges().sort_by_distance(p)[0] for p in [
        (-146.142419597, 5.715, 0.054253981),
    ]]
    fillet(fillet2_edges, radius=FILLET2_R)


solid = Compound([part_1.part, body_2_1.part])
